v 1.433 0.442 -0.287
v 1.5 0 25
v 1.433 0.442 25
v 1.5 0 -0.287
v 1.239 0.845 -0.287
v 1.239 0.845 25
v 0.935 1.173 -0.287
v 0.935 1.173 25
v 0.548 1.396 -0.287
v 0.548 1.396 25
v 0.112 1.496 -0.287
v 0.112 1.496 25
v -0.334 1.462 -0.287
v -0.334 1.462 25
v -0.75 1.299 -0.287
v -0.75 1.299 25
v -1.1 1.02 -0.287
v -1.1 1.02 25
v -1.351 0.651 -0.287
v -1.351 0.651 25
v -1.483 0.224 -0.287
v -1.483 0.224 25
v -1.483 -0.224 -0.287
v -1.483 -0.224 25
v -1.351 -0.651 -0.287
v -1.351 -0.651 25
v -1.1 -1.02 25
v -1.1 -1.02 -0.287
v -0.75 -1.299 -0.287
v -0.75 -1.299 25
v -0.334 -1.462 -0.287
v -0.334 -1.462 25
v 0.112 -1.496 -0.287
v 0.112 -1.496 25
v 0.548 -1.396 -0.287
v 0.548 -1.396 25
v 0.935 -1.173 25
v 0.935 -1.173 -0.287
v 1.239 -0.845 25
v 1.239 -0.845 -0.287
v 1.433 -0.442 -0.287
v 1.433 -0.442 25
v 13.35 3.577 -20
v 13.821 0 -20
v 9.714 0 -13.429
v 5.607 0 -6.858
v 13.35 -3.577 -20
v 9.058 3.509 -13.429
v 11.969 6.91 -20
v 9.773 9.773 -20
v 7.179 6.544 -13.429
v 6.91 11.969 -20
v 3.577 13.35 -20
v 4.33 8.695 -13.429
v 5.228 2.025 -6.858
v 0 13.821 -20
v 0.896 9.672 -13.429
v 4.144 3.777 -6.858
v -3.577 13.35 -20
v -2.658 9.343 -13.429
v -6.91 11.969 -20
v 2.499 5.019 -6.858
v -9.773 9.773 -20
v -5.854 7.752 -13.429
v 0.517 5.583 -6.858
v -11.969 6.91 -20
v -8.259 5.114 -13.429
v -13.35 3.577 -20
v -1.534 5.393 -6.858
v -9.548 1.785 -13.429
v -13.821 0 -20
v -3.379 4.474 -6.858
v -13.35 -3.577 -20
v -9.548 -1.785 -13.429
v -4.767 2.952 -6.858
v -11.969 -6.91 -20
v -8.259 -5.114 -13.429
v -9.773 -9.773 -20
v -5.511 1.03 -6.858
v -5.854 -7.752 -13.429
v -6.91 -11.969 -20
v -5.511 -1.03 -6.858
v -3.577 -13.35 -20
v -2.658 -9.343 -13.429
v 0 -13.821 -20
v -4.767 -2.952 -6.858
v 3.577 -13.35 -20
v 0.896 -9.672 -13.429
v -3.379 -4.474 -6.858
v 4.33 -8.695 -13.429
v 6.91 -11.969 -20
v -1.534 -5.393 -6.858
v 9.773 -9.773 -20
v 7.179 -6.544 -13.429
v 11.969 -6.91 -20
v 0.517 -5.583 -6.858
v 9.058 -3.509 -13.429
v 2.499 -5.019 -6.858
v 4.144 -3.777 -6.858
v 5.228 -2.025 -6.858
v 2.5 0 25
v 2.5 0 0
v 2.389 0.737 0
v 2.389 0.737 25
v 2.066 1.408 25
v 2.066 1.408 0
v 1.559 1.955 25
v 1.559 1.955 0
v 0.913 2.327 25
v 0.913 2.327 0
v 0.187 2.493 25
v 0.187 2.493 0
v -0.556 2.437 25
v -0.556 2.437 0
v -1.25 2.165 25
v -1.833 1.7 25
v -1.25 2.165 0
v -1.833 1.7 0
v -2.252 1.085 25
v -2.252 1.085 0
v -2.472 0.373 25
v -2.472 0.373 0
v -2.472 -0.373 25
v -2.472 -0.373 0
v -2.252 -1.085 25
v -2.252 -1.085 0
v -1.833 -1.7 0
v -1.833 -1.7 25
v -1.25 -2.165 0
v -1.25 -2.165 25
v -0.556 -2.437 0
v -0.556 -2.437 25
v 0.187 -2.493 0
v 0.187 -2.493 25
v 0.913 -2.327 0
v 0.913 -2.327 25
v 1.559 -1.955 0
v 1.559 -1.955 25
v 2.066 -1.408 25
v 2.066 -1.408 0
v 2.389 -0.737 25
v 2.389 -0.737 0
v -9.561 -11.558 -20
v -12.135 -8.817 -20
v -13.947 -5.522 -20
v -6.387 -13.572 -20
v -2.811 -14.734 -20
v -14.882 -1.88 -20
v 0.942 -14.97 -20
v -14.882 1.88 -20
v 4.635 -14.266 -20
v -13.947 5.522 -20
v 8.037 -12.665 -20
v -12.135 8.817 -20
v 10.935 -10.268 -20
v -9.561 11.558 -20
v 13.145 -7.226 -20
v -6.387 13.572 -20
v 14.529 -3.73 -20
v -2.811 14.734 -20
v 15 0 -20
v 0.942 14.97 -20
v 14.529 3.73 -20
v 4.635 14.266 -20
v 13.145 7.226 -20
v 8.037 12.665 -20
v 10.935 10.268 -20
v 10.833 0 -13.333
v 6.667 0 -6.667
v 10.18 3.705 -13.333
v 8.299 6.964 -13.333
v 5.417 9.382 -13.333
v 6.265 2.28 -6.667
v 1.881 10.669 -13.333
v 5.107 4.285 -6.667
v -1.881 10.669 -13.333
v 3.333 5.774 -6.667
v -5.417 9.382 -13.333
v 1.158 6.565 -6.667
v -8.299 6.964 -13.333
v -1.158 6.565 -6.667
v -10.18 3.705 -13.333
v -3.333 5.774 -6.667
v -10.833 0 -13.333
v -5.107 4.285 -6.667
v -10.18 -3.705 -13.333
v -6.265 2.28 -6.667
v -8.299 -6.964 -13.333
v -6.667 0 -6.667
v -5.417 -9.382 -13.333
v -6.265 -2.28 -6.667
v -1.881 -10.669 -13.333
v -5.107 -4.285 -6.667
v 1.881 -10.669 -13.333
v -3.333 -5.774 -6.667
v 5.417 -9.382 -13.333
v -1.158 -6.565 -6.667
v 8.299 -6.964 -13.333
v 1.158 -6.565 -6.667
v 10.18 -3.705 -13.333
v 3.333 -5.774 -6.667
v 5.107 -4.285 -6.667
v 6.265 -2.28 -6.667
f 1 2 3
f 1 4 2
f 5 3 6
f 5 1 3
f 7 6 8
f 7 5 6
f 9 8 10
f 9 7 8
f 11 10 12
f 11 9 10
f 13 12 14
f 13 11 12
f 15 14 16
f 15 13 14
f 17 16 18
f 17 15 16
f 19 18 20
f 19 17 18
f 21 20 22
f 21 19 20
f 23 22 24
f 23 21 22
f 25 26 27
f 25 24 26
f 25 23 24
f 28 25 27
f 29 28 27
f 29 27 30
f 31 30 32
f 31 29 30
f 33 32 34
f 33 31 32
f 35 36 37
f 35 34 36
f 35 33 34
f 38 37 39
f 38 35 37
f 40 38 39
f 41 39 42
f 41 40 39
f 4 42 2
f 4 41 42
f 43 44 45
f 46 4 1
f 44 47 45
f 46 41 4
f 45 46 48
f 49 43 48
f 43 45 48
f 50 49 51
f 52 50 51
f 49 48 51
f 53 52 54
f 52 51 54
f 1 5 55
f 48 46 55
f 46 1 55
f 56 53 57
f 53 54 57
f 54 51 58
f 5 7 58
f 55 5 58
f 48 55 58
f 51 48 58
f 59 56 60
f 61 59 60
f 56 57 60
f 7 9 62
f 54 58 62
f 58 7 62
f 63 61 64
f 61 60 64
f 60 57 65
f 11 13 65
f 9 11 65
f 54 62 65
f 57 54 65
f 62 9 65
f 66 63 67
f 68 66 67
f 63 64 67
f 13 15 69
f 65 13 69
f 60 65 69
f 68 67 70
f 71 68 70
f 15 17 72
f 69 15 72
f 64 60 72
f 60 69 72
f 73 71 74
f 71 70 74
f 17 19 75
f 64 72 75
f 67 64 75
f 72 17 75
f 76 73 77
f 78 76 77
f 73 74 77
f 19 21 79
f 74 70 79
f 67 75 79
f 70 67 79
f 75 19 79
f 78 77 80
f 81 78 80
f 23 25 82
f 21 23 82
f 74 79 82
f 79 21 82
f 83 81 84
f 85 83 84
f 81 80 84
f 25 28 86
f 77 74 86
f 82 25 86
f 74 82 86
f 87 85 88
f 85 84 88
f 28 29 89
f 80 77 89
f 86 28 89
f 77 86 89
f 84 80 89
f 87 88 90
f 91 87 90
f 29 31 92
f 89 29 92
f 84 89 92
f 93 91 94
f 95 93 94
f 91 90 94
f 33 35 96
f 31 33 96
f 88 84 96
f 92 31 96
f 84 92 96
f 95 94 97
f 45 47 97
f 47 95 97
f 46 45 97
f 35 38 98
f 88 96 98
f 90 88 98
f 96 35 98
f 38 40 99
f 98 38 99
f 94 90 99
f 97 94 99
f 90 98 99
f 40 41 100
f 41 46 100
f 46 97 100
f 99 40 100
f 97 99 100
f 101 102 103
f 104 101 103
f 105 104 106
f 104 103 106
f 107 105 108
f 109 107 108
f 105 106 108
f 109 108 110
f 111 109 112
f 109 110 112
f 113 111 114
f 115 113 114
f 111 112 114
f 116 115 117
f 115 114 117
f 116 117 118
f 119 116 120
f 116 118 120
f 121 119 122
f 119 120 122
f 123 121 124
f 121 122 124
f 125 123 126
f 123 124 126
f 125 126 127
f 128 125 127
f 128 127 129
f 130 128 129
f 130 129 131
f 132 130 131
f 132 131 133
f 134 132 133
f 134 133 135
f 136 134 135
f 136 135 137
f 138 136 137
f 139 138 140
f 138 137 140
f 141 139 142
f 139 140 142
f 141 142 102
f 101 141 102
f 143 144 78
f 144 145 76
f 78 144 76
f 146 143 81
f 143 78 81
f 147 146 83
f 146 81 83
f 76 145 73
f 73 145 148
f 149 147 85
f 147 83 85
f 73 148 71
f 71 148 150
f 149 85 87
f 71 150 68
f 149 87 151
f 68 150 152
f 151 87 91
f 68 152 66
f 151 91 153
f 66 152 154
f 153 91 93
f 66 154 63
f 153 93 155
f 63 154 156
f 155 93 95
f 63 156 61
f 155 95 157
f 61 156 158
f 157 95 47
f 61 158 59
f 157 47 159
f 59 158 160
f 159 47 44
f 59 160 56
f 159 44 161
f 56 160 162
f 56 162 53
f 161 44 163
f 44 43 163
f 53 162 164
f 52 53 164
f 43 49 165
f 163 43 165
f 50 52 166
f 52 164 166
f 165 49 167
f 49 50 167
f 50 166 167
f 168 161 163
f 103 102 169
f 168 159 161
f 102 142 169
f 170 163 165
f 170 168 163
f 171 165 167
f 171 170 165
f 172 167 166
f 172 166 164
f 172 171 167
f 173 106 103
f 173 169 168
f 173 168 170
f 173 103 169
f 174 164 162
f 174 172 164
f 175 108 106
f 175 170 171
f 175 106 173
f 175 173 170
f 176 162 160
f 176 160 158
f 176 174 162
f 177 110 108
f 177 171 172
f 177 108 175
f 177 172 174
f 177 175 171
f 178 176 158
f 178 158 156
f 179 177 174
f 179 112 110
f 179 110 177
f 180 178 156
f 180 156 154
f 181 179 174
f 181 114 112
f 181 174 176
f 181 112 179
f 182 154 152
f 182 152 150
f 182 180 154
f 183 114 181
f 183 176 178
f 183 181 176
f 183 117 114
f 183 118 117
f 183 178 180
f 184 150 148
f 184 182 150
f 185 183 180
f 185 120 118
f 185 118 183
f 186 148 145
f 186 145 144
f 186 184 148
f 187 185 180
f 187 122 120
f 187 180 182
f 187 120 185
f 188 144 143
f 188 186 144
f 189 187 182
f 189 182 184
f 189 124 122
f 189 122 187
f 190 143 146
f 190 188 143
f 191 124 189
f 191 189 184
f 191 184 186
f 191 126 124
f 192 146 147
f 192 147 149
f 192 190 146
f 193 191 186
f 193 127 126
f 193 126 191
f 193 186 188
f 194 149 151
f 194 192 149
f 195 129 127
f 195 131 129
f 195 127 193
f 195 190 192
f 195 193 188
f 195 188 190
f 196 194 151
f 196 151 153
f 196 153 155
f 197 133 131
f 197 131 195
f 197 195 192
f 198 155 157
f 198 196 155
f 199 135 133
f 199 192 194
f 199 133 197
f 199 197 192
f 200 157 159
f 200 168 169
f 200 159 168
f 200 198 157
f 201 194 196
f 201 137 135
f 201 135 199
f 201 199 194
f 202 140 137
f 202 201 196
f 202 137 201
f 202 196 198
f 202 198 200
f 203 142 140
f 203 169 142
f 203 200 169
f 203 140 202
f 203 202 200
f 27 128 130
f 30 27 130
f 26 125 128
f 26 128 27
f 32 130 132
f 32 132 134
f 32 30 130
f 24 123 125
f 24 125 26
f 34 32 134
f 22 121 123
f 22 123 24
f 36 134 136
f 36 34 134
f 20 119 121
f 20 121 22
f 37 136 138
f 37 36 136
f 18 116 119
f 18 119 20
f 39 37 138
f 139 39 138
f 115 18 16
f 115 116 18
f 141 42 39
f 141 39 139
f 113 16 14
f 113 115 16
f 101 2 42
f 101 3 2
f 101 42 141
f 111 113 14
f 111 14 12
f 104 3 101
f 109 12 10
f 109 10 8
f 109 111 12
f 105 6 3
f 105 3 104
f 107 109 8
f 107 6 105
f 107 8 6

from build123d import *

# Parameters (mm, degrees)
F0_R     = 2.5
F1_DEPTH = 25
F3_R     = 15
F5_T     = -1


with BuildPart() as f1:
    # F0 (on Top) → F1 (new body)
    with BuildSketch(Plane.XY):
        Circle(F0_R)
    extrude(amount=F1_DEPTH)

    # F3 (on offset) → F4 section 0
    with BuildSketch(Plane.XY.offset(-20)):
        Circle(F3_R)
    # F0 (on Top) → F4 section 1
    with BuildSketch(Plane.XY):
        Circle(F0_R)
    loft()

    # F5
    f5_openings = [f1.faces().sort_by_distance(p)[0] for p in [
        (0, 0, 25),
        (0, 0, -20),
    ]]
    offset(amount=F5_T, openings=f5_openings, kind=Kind.INTERSECTION)


solid = f1.part
